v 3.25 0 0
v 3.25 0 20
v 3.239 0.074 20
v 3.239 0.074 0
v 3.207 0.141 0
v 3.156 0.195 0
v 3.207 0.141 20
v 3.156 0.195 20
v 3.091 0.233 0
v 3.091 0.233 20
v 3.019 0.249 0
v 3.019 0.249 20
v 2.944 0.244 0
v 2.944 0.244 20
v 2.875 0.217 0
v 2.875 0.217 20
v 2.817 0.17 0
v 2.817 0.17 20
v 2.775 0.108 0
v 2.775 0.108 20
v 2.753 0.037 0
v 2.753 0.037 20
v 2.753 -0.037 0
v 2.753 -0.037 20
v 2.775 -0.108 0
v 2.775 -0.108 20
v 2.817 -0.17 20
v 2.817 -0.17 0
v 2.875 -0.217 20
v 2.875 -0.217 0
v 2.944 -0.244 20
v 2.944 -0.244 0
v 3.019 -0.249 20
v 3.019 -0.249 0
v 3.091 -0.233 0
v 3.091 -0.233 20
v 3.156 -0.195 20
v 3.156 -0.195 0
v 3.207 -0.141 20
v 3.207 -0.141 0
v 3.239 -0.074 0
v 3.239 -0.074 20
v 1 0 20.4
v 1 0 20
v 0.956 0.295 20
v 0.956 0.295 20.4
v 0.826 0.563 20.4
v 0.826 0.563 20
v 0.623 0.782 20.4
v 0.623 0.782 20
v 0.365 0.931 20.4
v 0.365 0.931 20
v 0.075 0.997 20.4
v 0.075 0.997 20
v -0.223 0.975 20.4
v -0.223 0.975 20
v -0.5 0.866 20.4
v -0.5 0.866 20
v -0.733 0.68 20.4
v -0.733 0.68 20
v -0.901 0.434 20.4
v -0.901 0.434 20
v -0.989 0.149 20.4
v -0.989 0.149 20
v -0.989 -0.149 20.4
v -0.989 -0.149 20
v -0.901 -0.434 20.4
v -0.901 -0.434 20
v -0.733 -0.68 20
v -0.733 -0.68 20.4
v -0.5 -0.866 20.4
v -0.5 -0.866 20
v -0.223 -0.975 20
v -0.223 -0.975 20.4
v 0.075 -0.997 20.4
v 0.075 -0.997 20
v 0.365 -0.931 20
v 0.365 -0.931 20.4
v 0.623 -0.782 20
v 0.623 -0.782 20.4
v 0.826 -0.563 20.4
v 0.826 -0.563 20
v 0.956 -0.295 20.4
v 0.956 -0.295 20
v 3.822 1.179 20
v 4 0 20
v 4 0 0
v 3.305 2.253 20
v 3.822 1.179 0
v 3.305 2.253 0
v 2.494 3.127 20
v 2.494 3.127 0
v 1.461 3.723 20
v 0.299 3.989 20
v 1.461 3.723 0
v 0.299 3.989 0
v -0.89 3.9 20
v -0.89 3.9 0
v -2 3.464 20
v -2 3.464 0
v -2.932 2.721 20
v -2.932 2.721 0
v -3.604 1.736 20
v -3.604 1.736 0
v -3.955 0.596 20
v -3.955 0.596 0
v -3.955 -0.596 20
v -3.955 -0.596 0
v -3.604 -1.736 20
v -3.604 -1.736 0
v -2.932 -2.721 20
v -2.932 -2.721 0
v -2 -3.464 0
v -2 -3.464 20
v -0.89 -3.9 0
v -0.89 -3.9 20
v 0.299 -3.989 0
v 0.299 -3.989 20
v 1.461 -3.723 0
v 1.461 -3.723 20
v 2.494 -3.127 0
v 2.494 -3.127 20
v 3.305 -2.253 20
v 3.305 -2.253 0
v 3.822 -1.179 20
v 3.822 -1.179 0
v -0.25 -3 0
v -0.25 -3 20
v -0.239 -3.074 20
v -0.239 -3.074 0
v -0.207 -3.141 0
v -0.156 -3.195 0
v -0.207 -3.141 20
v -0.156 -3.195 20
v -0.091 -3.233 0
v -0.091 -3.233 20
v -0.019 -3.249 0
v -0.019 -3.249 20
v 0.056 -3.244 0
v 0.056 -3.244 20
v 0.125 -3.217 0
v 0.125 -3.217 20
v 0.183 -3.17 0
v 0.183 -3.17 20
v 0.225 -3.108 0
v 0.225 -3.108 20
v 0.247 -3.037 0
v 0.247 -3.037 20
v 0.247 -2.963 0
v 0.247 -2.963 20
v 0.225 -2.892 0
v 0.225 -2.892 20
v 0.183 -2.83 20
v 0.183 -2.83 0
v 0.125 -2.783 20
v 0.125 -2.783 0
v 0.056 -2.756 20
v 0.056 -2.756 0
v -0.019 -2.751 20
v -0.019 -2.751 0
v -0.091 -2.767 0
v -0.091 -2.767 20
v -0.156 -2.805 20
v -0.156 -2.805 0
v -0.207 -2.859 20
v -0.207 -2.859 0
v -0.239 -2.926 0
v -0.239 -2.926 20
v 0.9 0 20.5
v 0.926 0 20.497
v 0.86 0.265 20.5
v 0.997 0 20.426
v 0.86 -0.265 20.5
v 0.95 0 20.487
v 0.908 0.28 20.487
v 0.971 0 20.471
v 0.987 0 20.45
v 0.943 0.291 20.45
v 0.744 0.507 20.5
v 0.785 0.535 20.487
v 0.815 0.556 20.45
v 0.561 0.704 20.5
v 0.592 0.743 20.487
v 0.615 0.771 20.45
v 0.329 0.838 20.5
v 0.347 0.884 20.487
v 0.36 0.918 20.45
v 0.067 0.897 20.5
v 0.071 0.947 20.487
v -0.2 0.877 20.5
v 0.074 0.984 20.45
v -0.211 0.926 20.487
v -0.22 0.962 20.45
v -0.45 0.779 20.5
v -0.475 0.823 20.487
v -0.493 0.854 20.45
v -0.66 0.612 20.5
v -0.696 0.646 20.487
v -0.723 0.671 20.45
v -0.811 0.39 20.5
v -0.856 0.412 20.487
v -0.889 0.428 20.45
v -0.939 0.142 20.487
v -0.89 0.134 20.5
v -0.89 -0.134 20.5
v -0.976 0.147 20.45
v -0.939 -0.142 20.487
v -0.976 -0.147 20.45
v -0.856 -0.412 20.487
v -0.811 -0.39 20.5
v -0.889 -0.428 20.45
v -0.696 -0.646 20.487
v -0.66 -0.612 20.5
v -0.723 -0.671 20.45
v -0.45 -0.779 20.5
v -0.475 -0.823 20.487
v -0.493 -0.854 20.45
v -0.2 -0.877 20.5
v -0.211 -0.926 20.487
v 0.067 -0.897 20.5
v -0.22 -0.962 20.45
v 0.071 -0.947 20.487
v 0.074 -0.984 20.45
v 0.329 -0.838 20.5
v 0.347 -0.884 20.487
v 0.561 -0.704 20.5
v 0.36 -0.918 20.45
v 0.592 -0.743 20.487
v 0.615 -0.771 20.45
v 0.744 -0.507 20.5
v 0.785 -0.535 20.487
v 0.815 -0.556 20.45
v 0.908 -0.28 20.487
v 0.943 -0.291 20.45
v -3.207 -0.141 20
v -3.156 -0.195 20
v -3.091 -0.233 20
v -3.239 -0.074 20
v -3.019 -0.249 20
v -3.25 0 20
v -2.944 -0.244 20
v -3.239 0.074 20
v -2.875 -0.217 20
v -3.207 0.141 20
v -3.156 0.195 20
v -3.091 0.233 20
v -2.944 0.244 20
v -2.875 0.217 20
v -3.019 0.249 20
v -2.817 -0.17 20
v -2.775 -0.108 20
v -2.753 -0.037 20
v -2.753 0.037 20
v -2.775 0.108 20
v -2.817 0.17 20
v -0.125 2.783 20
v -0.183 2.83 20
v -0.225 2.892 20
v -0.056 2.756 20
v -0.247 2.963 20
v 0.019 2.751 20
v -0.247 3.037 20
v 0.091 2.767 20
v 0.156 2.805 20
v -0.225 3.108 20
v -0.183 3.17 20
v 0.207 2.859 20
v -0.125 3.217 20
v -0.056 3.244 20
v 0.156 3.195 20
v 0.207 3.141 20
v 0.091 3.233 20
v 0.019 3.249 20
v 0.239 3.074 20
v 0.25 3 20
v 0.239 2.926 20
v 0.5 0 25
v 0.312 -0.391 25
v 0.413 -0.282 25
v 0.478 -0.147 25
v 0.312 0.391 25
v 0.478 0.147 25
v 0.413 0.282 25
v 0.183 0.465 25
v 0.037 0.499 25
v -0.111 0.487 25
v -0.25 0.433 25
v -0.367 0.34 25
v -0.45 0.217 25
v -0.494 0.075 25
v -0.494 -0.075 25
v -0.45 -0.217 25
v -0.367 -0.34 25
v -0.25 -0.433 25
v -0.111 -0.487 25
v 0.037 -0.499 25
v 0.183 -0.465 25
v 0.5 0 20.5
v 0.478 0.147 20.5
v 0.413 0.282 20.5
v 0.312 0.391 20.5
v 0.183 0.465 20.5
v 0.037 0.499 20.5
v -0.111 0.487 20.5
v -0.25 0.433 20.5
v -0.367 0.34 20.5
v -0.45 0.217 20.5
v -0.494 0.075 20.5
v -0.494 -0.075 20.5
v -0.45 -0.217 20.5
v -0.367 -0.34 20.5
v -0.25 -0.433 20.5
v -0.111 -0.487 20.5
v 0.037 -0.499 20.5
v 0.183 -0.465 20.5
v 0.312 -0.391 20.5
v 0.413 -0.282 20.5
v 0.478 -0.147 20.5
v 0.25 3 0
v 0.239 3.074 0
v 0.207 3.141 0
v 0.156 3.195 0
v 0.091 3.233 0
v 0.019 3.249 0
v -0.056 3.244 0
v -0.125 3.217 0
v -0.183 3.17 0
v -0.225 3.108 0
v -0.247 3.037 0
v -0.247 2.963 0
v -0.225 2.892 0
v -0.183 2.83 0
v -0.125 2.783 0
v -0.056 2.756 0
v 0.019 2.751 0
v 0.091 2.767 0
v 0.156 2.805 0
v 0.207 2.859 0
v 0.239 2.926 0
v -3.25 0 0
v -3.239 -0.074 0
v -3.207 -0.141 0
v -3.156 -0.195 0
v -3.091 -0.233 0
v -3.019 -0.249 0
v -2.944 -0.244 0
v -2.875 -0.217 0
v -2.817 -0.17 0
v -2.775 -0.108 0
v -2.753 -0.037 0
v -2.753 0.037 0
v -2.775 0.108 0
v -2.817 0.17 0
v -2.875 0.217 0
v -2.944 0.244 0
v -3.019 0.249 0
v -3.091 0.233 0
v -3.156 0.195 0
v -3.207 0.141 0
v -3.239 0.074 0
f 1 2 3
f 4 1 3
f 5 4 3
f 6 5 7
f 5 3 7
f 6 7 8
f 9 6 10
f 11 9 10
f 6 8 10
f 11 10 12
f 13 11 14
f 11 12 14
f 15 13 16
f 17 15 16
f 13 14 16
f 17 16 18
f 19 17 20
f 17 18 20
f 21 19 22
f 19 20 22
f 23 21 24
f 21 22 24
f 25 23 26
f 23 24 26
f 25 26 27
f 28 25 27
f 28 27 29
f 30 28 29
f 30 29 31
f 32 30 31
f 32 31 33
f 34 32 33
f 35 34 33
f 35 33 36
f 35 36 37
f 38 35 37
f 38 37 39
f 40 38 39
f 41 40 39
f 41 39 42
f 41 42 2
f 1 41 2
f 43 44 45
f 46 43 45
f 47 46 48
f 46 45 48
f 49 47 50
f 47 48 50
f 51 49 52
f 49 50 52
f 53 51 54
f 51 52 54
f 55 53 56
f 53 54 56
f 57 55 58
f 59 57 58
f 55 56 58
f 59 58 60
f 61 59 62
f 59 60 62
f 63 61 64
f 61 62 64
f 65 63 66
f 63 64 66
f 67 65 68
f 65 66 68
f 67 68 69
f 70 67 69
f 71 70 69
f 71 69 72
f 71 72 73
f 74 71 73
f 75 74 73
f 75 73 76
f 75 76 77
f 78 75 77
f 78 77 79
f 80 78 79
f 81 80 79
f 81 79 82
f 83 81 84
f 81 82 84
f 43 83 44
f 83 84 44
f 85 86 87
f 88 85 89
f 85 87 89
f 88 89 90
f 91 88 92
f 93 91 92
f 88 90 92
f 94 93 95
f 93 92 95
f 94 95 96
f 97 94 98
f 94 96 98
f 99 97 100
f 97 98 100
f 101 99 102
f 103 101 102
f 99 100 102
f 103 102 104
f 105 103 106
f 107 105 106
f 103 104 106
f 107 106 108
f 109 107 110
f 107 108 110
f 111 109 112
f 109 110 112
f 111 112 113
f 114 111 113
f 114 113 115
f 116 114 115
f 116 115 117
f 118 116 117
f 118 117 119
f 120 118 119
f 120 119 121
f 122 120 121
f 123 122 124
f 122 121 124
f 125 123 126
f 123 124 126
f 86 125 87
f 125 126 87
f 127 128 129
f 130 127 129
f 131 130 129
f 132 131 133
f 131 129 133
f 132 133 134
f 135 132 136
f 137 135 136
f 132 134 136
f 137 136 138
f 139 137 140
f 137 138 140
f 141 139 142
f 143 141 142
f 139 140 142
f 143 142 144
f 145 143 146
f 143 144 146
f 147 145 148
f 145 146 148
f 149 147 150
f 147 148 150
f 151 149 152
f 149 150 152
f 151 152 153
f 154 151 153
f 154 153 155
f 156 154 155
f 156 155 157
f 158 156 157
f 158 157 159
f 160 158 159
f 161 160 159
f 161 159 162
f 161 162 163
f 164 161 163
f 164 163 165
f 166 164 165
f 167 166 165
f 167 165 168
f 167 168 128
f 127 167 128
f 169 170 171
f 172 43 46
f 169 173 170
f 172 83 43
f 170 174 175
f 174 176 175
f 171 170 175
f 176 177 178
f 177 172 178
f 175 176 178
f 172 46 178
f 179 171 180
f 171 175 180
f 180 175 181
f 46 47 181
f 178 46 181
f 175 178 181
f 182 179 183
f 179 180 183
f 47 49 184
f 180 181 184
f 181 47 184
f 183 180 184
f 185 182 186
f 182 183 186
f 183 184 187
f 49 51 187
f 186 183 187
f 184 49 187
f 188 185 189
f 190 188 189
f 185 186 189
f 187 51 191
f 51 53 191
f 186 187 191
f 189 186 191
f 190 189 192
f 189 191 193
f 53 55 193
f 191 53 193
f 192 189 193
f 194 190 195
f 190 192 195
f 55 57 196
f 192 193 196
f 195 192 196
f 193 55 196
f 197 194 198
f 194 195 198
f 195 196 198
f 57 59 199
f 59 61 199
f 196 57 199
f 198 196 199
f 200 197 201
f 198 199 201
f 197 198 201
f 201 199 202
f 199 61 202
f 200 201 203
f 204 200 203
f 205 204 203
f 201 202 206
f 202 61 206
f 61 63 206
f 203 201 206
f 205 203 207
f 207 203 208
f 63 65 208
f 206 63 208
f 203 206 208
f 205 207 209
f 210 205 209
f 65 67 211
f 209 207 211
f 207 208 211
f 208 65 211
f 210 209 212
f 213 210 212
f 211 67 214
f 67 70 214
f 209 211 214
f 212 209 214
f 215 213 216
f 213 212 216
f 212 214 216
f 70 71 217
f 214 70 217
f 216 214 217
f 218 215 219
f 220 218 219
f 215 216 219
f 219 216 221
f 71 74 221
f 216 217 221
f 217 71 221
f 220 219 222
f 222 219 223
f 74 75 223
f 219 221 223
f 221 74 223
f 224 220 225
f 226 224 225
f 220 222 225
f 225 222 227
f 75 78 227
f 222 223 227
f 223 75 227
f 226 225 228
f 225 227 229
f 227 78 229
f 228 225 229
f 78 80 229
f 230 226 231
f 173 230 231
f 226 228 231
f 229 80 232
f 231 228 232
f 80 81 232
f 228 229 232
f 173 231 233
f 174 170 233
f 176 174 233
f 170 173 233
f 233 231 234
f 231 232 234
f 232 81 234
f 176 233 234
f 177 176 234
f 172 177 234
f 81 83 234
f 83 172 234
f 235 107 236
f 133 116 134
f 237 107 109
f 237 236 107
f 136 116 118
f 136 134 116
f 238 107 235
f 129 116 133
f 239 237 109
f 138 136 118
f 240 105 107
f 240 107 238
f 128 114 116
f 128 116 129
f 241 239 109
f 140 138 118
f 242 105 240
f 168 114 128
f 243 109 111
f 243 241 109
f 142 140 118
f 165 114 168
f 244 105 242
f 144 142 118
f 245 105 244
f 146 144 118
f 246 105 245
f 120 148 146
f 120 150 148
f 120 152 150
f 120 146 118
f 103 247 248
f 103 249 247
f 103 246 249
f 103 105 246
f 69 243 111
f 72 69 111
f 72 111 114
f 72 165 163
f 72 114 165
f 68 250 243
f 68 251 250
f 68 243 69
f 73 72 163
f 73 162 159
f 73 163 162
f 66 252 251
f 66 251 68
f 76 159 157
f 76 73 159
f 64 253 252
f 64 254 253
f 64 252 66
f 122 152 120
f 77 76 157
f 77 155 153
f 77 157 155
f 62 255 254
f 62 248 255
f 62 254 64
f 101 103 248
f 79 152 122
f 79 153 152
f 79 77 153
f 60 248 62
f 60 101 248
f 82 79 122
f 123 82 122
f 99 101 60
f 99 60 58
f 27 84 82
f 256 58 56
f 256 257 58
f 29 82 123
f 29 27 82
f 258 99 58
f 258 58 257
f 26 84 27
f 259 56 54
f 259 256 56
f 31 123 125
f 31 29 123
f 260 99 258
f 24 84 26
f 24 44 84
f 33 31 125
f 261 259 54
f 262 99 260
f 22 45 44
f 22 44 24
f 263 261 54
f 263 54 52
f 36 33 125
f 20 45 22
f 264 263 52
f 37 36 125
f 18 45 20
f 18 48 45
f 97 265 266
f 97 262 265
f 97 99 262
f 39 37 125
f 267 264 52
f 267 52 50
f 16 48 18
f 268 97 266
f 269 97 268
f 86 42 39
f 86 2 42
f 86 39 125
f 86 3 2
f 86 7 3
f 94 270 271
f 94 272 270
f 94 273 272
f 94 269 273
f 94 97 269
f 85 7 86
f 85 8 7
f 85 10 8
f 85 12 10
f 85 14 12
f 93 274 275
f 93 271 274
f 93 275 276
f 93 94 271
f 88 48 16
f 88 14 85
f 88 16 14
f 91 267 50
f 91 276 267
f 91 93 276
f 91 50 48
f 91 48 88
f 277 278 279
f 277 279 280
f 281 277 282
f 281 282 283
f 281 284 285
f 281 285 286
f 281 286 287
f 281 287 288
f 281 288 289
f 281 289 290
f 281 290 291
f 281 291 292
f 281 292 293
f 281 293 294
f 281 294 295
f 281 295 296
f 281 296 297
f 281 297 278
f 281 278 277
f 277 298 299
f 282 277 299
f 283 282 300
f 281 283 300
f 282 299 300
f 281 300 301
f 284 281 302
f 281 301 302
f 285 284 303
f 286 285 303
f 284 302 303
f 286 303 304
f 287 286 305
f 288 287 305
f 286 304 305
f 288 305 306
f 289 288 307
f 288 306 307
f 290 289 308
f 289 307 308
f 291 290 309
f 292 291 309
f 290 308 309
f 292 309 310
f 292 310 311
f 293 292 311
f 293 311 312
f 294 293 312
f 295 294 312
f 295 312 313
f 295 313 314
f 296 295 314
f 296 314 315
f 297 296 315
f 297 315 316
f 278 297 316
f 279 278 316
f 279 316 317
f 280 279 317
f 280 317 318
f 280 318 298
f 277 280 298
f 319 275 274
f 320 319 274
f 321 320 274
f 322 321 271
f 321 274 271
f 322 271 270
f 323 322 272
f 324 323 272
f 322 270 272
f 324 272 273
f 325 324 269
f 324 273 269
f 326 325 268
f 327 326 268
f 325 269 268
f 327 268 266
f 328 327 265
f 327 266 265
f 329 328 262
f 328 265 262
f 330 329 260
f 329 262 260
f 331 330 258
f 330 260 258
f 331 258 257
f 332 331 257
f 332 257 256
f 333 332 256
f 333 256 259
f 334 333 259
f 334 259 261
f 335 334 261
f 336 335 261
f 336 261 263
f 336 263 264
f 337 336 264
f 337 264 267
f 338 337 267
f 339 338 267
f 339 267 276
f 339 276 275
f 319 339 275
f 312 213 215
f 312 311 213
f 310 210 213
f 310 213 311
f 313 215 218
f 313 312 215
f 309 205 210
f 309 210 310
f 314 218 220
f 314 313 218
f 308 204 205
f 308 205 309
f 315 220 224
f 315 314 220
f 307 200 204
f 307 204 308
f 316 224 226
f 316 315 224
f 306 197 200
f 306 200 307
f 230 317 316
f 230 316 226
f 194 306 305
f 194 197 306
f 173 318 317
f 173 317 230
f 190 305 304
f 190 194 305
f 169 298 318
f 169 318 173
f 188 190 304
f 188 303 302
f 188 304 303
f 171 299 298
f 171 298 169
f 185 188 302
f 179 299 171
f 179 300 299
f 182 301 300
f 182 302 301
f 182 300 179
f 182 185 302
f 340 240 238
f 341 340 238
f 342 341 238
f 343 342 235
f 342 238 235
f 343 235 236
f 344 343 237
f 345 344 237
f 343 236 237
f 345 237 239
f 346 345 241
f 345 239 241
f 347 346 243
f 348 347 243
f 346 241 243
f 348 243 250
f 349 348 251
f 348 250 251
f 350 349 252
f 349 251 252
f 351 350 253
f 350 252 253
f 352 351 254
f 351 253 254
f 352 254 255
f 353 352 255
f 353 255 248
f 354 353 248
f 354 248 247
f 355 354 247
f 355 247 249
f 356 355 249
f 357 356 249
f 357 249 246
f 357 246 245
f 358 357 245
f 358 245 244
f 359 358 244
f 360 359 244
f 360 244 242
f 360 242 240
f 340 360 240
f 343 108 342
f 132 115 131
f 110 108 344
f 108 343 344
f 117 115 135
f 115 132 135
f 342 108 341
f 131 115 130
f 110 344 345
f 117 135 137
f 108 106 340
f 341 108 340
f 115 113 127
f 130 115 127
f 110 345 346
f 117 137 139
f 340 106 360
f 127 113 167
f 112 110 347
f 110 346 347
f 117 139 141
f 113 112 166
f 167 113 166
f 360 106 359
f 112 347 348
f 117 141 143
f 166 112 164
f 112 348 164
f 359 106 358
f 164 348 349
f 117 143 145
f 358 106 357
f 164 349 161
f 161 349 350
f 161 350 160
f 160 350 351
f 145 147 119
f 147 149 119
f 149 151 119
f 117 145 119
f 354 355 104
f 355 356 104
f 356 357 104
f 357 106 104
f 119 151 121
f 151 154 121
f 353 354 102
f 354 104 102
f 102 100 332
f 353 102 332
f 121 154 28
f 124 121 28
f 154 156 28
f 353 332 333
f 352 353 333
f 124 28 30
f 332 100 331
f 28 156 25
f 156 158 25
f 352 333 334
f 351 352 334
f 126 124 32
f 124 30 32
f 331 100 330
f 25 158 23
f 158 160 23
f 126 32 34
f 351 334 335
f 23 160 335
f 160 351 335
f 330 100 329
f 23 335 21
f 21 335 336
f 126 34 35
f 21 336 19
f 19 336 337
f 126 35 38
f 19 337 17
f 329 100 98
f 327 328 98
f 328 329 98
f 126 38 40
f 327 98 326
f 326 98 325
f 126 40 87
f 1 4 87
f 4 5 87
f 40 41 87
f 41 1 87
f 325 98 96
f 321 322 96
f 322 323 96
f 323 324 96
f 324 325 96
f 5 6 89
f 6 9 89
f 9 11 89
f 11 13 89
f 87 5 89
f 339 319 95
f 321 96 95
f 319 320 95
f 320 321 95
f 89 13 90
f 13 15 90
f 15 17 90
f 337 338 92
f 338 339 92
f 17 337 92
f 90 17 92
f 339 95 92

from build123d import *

# Parameters (mm, degrees)
SKETCH1_R           = 4
BOSS_EXTRUDE1_DEPTH = 20
SKETCH2_R           = 1
SKETCH2_R_2         = 0.5
BOSS_EXTRUDE2_DEPTH = 0.5
SKETCH4_R           = 0.5
BOSS_EXTRUDE3_DEPTH = 5
FILLET2_R           = 0.1
SKETCH5_R           = 0.25
CUT_EXTRUDE1_DEPTH  = 21.784609691


with BuildPart() as part:
    # Sketch1 → Boss-Extrude1 (new body)
    with BuildSketch(Plane.XY):
        Circle(SKETCH1_R)
    extrude(amount=BOSS_EXTRUDE1_DEPTH)

    # Sketch2 → Boss-Extrude2 (add)
    with BuildSketch(Plane.XY.offset(20)):
        Circle(SKETCH2_R)
        Circle(SKETCH2_R_2, mode=Mode.SUBTRACT)
    extrude(amount=BOSS_EXTRUDE2_DEPTH)

    # Sketch4 → Boss-Extrude3 (add)
    with BuildSketch(Plane.XY.offset(20)):
        Circle(SKETCH4_R)
    extrude(amount=BOSS_EXTRUDE3_DEPTH)

    # Fillet2
    fillet2_edges = [part.edges().sort_by_distance(p)[0] for p in [
        (-1, 0, 20.5),
    ]]
    fillet(fillet2_edges, radius=FILLET2_R)

    # Sketch5 → Cut-Extrude1 (cut, through all)
    with BuildSketch(Plane.XY.offset(20)):
        with Locations((0, 3)):
            Circle(SKETCH5_R)
        with Locations(Location((0, -3, 0), (0, 0, 180))):
            Circle(SKETCH5_R)
        with Locations((3, 0)):
            Circle(SKETCH5_R)
        with Locations(Location((-3, 0, 0), (0, 0, 180))):
            Circle(SKETCH5_R)
    extrude(amount=-CUT_EXTRUDE1_DEPTH, mode=Mode.SUBTRACT)


solid = part.part
